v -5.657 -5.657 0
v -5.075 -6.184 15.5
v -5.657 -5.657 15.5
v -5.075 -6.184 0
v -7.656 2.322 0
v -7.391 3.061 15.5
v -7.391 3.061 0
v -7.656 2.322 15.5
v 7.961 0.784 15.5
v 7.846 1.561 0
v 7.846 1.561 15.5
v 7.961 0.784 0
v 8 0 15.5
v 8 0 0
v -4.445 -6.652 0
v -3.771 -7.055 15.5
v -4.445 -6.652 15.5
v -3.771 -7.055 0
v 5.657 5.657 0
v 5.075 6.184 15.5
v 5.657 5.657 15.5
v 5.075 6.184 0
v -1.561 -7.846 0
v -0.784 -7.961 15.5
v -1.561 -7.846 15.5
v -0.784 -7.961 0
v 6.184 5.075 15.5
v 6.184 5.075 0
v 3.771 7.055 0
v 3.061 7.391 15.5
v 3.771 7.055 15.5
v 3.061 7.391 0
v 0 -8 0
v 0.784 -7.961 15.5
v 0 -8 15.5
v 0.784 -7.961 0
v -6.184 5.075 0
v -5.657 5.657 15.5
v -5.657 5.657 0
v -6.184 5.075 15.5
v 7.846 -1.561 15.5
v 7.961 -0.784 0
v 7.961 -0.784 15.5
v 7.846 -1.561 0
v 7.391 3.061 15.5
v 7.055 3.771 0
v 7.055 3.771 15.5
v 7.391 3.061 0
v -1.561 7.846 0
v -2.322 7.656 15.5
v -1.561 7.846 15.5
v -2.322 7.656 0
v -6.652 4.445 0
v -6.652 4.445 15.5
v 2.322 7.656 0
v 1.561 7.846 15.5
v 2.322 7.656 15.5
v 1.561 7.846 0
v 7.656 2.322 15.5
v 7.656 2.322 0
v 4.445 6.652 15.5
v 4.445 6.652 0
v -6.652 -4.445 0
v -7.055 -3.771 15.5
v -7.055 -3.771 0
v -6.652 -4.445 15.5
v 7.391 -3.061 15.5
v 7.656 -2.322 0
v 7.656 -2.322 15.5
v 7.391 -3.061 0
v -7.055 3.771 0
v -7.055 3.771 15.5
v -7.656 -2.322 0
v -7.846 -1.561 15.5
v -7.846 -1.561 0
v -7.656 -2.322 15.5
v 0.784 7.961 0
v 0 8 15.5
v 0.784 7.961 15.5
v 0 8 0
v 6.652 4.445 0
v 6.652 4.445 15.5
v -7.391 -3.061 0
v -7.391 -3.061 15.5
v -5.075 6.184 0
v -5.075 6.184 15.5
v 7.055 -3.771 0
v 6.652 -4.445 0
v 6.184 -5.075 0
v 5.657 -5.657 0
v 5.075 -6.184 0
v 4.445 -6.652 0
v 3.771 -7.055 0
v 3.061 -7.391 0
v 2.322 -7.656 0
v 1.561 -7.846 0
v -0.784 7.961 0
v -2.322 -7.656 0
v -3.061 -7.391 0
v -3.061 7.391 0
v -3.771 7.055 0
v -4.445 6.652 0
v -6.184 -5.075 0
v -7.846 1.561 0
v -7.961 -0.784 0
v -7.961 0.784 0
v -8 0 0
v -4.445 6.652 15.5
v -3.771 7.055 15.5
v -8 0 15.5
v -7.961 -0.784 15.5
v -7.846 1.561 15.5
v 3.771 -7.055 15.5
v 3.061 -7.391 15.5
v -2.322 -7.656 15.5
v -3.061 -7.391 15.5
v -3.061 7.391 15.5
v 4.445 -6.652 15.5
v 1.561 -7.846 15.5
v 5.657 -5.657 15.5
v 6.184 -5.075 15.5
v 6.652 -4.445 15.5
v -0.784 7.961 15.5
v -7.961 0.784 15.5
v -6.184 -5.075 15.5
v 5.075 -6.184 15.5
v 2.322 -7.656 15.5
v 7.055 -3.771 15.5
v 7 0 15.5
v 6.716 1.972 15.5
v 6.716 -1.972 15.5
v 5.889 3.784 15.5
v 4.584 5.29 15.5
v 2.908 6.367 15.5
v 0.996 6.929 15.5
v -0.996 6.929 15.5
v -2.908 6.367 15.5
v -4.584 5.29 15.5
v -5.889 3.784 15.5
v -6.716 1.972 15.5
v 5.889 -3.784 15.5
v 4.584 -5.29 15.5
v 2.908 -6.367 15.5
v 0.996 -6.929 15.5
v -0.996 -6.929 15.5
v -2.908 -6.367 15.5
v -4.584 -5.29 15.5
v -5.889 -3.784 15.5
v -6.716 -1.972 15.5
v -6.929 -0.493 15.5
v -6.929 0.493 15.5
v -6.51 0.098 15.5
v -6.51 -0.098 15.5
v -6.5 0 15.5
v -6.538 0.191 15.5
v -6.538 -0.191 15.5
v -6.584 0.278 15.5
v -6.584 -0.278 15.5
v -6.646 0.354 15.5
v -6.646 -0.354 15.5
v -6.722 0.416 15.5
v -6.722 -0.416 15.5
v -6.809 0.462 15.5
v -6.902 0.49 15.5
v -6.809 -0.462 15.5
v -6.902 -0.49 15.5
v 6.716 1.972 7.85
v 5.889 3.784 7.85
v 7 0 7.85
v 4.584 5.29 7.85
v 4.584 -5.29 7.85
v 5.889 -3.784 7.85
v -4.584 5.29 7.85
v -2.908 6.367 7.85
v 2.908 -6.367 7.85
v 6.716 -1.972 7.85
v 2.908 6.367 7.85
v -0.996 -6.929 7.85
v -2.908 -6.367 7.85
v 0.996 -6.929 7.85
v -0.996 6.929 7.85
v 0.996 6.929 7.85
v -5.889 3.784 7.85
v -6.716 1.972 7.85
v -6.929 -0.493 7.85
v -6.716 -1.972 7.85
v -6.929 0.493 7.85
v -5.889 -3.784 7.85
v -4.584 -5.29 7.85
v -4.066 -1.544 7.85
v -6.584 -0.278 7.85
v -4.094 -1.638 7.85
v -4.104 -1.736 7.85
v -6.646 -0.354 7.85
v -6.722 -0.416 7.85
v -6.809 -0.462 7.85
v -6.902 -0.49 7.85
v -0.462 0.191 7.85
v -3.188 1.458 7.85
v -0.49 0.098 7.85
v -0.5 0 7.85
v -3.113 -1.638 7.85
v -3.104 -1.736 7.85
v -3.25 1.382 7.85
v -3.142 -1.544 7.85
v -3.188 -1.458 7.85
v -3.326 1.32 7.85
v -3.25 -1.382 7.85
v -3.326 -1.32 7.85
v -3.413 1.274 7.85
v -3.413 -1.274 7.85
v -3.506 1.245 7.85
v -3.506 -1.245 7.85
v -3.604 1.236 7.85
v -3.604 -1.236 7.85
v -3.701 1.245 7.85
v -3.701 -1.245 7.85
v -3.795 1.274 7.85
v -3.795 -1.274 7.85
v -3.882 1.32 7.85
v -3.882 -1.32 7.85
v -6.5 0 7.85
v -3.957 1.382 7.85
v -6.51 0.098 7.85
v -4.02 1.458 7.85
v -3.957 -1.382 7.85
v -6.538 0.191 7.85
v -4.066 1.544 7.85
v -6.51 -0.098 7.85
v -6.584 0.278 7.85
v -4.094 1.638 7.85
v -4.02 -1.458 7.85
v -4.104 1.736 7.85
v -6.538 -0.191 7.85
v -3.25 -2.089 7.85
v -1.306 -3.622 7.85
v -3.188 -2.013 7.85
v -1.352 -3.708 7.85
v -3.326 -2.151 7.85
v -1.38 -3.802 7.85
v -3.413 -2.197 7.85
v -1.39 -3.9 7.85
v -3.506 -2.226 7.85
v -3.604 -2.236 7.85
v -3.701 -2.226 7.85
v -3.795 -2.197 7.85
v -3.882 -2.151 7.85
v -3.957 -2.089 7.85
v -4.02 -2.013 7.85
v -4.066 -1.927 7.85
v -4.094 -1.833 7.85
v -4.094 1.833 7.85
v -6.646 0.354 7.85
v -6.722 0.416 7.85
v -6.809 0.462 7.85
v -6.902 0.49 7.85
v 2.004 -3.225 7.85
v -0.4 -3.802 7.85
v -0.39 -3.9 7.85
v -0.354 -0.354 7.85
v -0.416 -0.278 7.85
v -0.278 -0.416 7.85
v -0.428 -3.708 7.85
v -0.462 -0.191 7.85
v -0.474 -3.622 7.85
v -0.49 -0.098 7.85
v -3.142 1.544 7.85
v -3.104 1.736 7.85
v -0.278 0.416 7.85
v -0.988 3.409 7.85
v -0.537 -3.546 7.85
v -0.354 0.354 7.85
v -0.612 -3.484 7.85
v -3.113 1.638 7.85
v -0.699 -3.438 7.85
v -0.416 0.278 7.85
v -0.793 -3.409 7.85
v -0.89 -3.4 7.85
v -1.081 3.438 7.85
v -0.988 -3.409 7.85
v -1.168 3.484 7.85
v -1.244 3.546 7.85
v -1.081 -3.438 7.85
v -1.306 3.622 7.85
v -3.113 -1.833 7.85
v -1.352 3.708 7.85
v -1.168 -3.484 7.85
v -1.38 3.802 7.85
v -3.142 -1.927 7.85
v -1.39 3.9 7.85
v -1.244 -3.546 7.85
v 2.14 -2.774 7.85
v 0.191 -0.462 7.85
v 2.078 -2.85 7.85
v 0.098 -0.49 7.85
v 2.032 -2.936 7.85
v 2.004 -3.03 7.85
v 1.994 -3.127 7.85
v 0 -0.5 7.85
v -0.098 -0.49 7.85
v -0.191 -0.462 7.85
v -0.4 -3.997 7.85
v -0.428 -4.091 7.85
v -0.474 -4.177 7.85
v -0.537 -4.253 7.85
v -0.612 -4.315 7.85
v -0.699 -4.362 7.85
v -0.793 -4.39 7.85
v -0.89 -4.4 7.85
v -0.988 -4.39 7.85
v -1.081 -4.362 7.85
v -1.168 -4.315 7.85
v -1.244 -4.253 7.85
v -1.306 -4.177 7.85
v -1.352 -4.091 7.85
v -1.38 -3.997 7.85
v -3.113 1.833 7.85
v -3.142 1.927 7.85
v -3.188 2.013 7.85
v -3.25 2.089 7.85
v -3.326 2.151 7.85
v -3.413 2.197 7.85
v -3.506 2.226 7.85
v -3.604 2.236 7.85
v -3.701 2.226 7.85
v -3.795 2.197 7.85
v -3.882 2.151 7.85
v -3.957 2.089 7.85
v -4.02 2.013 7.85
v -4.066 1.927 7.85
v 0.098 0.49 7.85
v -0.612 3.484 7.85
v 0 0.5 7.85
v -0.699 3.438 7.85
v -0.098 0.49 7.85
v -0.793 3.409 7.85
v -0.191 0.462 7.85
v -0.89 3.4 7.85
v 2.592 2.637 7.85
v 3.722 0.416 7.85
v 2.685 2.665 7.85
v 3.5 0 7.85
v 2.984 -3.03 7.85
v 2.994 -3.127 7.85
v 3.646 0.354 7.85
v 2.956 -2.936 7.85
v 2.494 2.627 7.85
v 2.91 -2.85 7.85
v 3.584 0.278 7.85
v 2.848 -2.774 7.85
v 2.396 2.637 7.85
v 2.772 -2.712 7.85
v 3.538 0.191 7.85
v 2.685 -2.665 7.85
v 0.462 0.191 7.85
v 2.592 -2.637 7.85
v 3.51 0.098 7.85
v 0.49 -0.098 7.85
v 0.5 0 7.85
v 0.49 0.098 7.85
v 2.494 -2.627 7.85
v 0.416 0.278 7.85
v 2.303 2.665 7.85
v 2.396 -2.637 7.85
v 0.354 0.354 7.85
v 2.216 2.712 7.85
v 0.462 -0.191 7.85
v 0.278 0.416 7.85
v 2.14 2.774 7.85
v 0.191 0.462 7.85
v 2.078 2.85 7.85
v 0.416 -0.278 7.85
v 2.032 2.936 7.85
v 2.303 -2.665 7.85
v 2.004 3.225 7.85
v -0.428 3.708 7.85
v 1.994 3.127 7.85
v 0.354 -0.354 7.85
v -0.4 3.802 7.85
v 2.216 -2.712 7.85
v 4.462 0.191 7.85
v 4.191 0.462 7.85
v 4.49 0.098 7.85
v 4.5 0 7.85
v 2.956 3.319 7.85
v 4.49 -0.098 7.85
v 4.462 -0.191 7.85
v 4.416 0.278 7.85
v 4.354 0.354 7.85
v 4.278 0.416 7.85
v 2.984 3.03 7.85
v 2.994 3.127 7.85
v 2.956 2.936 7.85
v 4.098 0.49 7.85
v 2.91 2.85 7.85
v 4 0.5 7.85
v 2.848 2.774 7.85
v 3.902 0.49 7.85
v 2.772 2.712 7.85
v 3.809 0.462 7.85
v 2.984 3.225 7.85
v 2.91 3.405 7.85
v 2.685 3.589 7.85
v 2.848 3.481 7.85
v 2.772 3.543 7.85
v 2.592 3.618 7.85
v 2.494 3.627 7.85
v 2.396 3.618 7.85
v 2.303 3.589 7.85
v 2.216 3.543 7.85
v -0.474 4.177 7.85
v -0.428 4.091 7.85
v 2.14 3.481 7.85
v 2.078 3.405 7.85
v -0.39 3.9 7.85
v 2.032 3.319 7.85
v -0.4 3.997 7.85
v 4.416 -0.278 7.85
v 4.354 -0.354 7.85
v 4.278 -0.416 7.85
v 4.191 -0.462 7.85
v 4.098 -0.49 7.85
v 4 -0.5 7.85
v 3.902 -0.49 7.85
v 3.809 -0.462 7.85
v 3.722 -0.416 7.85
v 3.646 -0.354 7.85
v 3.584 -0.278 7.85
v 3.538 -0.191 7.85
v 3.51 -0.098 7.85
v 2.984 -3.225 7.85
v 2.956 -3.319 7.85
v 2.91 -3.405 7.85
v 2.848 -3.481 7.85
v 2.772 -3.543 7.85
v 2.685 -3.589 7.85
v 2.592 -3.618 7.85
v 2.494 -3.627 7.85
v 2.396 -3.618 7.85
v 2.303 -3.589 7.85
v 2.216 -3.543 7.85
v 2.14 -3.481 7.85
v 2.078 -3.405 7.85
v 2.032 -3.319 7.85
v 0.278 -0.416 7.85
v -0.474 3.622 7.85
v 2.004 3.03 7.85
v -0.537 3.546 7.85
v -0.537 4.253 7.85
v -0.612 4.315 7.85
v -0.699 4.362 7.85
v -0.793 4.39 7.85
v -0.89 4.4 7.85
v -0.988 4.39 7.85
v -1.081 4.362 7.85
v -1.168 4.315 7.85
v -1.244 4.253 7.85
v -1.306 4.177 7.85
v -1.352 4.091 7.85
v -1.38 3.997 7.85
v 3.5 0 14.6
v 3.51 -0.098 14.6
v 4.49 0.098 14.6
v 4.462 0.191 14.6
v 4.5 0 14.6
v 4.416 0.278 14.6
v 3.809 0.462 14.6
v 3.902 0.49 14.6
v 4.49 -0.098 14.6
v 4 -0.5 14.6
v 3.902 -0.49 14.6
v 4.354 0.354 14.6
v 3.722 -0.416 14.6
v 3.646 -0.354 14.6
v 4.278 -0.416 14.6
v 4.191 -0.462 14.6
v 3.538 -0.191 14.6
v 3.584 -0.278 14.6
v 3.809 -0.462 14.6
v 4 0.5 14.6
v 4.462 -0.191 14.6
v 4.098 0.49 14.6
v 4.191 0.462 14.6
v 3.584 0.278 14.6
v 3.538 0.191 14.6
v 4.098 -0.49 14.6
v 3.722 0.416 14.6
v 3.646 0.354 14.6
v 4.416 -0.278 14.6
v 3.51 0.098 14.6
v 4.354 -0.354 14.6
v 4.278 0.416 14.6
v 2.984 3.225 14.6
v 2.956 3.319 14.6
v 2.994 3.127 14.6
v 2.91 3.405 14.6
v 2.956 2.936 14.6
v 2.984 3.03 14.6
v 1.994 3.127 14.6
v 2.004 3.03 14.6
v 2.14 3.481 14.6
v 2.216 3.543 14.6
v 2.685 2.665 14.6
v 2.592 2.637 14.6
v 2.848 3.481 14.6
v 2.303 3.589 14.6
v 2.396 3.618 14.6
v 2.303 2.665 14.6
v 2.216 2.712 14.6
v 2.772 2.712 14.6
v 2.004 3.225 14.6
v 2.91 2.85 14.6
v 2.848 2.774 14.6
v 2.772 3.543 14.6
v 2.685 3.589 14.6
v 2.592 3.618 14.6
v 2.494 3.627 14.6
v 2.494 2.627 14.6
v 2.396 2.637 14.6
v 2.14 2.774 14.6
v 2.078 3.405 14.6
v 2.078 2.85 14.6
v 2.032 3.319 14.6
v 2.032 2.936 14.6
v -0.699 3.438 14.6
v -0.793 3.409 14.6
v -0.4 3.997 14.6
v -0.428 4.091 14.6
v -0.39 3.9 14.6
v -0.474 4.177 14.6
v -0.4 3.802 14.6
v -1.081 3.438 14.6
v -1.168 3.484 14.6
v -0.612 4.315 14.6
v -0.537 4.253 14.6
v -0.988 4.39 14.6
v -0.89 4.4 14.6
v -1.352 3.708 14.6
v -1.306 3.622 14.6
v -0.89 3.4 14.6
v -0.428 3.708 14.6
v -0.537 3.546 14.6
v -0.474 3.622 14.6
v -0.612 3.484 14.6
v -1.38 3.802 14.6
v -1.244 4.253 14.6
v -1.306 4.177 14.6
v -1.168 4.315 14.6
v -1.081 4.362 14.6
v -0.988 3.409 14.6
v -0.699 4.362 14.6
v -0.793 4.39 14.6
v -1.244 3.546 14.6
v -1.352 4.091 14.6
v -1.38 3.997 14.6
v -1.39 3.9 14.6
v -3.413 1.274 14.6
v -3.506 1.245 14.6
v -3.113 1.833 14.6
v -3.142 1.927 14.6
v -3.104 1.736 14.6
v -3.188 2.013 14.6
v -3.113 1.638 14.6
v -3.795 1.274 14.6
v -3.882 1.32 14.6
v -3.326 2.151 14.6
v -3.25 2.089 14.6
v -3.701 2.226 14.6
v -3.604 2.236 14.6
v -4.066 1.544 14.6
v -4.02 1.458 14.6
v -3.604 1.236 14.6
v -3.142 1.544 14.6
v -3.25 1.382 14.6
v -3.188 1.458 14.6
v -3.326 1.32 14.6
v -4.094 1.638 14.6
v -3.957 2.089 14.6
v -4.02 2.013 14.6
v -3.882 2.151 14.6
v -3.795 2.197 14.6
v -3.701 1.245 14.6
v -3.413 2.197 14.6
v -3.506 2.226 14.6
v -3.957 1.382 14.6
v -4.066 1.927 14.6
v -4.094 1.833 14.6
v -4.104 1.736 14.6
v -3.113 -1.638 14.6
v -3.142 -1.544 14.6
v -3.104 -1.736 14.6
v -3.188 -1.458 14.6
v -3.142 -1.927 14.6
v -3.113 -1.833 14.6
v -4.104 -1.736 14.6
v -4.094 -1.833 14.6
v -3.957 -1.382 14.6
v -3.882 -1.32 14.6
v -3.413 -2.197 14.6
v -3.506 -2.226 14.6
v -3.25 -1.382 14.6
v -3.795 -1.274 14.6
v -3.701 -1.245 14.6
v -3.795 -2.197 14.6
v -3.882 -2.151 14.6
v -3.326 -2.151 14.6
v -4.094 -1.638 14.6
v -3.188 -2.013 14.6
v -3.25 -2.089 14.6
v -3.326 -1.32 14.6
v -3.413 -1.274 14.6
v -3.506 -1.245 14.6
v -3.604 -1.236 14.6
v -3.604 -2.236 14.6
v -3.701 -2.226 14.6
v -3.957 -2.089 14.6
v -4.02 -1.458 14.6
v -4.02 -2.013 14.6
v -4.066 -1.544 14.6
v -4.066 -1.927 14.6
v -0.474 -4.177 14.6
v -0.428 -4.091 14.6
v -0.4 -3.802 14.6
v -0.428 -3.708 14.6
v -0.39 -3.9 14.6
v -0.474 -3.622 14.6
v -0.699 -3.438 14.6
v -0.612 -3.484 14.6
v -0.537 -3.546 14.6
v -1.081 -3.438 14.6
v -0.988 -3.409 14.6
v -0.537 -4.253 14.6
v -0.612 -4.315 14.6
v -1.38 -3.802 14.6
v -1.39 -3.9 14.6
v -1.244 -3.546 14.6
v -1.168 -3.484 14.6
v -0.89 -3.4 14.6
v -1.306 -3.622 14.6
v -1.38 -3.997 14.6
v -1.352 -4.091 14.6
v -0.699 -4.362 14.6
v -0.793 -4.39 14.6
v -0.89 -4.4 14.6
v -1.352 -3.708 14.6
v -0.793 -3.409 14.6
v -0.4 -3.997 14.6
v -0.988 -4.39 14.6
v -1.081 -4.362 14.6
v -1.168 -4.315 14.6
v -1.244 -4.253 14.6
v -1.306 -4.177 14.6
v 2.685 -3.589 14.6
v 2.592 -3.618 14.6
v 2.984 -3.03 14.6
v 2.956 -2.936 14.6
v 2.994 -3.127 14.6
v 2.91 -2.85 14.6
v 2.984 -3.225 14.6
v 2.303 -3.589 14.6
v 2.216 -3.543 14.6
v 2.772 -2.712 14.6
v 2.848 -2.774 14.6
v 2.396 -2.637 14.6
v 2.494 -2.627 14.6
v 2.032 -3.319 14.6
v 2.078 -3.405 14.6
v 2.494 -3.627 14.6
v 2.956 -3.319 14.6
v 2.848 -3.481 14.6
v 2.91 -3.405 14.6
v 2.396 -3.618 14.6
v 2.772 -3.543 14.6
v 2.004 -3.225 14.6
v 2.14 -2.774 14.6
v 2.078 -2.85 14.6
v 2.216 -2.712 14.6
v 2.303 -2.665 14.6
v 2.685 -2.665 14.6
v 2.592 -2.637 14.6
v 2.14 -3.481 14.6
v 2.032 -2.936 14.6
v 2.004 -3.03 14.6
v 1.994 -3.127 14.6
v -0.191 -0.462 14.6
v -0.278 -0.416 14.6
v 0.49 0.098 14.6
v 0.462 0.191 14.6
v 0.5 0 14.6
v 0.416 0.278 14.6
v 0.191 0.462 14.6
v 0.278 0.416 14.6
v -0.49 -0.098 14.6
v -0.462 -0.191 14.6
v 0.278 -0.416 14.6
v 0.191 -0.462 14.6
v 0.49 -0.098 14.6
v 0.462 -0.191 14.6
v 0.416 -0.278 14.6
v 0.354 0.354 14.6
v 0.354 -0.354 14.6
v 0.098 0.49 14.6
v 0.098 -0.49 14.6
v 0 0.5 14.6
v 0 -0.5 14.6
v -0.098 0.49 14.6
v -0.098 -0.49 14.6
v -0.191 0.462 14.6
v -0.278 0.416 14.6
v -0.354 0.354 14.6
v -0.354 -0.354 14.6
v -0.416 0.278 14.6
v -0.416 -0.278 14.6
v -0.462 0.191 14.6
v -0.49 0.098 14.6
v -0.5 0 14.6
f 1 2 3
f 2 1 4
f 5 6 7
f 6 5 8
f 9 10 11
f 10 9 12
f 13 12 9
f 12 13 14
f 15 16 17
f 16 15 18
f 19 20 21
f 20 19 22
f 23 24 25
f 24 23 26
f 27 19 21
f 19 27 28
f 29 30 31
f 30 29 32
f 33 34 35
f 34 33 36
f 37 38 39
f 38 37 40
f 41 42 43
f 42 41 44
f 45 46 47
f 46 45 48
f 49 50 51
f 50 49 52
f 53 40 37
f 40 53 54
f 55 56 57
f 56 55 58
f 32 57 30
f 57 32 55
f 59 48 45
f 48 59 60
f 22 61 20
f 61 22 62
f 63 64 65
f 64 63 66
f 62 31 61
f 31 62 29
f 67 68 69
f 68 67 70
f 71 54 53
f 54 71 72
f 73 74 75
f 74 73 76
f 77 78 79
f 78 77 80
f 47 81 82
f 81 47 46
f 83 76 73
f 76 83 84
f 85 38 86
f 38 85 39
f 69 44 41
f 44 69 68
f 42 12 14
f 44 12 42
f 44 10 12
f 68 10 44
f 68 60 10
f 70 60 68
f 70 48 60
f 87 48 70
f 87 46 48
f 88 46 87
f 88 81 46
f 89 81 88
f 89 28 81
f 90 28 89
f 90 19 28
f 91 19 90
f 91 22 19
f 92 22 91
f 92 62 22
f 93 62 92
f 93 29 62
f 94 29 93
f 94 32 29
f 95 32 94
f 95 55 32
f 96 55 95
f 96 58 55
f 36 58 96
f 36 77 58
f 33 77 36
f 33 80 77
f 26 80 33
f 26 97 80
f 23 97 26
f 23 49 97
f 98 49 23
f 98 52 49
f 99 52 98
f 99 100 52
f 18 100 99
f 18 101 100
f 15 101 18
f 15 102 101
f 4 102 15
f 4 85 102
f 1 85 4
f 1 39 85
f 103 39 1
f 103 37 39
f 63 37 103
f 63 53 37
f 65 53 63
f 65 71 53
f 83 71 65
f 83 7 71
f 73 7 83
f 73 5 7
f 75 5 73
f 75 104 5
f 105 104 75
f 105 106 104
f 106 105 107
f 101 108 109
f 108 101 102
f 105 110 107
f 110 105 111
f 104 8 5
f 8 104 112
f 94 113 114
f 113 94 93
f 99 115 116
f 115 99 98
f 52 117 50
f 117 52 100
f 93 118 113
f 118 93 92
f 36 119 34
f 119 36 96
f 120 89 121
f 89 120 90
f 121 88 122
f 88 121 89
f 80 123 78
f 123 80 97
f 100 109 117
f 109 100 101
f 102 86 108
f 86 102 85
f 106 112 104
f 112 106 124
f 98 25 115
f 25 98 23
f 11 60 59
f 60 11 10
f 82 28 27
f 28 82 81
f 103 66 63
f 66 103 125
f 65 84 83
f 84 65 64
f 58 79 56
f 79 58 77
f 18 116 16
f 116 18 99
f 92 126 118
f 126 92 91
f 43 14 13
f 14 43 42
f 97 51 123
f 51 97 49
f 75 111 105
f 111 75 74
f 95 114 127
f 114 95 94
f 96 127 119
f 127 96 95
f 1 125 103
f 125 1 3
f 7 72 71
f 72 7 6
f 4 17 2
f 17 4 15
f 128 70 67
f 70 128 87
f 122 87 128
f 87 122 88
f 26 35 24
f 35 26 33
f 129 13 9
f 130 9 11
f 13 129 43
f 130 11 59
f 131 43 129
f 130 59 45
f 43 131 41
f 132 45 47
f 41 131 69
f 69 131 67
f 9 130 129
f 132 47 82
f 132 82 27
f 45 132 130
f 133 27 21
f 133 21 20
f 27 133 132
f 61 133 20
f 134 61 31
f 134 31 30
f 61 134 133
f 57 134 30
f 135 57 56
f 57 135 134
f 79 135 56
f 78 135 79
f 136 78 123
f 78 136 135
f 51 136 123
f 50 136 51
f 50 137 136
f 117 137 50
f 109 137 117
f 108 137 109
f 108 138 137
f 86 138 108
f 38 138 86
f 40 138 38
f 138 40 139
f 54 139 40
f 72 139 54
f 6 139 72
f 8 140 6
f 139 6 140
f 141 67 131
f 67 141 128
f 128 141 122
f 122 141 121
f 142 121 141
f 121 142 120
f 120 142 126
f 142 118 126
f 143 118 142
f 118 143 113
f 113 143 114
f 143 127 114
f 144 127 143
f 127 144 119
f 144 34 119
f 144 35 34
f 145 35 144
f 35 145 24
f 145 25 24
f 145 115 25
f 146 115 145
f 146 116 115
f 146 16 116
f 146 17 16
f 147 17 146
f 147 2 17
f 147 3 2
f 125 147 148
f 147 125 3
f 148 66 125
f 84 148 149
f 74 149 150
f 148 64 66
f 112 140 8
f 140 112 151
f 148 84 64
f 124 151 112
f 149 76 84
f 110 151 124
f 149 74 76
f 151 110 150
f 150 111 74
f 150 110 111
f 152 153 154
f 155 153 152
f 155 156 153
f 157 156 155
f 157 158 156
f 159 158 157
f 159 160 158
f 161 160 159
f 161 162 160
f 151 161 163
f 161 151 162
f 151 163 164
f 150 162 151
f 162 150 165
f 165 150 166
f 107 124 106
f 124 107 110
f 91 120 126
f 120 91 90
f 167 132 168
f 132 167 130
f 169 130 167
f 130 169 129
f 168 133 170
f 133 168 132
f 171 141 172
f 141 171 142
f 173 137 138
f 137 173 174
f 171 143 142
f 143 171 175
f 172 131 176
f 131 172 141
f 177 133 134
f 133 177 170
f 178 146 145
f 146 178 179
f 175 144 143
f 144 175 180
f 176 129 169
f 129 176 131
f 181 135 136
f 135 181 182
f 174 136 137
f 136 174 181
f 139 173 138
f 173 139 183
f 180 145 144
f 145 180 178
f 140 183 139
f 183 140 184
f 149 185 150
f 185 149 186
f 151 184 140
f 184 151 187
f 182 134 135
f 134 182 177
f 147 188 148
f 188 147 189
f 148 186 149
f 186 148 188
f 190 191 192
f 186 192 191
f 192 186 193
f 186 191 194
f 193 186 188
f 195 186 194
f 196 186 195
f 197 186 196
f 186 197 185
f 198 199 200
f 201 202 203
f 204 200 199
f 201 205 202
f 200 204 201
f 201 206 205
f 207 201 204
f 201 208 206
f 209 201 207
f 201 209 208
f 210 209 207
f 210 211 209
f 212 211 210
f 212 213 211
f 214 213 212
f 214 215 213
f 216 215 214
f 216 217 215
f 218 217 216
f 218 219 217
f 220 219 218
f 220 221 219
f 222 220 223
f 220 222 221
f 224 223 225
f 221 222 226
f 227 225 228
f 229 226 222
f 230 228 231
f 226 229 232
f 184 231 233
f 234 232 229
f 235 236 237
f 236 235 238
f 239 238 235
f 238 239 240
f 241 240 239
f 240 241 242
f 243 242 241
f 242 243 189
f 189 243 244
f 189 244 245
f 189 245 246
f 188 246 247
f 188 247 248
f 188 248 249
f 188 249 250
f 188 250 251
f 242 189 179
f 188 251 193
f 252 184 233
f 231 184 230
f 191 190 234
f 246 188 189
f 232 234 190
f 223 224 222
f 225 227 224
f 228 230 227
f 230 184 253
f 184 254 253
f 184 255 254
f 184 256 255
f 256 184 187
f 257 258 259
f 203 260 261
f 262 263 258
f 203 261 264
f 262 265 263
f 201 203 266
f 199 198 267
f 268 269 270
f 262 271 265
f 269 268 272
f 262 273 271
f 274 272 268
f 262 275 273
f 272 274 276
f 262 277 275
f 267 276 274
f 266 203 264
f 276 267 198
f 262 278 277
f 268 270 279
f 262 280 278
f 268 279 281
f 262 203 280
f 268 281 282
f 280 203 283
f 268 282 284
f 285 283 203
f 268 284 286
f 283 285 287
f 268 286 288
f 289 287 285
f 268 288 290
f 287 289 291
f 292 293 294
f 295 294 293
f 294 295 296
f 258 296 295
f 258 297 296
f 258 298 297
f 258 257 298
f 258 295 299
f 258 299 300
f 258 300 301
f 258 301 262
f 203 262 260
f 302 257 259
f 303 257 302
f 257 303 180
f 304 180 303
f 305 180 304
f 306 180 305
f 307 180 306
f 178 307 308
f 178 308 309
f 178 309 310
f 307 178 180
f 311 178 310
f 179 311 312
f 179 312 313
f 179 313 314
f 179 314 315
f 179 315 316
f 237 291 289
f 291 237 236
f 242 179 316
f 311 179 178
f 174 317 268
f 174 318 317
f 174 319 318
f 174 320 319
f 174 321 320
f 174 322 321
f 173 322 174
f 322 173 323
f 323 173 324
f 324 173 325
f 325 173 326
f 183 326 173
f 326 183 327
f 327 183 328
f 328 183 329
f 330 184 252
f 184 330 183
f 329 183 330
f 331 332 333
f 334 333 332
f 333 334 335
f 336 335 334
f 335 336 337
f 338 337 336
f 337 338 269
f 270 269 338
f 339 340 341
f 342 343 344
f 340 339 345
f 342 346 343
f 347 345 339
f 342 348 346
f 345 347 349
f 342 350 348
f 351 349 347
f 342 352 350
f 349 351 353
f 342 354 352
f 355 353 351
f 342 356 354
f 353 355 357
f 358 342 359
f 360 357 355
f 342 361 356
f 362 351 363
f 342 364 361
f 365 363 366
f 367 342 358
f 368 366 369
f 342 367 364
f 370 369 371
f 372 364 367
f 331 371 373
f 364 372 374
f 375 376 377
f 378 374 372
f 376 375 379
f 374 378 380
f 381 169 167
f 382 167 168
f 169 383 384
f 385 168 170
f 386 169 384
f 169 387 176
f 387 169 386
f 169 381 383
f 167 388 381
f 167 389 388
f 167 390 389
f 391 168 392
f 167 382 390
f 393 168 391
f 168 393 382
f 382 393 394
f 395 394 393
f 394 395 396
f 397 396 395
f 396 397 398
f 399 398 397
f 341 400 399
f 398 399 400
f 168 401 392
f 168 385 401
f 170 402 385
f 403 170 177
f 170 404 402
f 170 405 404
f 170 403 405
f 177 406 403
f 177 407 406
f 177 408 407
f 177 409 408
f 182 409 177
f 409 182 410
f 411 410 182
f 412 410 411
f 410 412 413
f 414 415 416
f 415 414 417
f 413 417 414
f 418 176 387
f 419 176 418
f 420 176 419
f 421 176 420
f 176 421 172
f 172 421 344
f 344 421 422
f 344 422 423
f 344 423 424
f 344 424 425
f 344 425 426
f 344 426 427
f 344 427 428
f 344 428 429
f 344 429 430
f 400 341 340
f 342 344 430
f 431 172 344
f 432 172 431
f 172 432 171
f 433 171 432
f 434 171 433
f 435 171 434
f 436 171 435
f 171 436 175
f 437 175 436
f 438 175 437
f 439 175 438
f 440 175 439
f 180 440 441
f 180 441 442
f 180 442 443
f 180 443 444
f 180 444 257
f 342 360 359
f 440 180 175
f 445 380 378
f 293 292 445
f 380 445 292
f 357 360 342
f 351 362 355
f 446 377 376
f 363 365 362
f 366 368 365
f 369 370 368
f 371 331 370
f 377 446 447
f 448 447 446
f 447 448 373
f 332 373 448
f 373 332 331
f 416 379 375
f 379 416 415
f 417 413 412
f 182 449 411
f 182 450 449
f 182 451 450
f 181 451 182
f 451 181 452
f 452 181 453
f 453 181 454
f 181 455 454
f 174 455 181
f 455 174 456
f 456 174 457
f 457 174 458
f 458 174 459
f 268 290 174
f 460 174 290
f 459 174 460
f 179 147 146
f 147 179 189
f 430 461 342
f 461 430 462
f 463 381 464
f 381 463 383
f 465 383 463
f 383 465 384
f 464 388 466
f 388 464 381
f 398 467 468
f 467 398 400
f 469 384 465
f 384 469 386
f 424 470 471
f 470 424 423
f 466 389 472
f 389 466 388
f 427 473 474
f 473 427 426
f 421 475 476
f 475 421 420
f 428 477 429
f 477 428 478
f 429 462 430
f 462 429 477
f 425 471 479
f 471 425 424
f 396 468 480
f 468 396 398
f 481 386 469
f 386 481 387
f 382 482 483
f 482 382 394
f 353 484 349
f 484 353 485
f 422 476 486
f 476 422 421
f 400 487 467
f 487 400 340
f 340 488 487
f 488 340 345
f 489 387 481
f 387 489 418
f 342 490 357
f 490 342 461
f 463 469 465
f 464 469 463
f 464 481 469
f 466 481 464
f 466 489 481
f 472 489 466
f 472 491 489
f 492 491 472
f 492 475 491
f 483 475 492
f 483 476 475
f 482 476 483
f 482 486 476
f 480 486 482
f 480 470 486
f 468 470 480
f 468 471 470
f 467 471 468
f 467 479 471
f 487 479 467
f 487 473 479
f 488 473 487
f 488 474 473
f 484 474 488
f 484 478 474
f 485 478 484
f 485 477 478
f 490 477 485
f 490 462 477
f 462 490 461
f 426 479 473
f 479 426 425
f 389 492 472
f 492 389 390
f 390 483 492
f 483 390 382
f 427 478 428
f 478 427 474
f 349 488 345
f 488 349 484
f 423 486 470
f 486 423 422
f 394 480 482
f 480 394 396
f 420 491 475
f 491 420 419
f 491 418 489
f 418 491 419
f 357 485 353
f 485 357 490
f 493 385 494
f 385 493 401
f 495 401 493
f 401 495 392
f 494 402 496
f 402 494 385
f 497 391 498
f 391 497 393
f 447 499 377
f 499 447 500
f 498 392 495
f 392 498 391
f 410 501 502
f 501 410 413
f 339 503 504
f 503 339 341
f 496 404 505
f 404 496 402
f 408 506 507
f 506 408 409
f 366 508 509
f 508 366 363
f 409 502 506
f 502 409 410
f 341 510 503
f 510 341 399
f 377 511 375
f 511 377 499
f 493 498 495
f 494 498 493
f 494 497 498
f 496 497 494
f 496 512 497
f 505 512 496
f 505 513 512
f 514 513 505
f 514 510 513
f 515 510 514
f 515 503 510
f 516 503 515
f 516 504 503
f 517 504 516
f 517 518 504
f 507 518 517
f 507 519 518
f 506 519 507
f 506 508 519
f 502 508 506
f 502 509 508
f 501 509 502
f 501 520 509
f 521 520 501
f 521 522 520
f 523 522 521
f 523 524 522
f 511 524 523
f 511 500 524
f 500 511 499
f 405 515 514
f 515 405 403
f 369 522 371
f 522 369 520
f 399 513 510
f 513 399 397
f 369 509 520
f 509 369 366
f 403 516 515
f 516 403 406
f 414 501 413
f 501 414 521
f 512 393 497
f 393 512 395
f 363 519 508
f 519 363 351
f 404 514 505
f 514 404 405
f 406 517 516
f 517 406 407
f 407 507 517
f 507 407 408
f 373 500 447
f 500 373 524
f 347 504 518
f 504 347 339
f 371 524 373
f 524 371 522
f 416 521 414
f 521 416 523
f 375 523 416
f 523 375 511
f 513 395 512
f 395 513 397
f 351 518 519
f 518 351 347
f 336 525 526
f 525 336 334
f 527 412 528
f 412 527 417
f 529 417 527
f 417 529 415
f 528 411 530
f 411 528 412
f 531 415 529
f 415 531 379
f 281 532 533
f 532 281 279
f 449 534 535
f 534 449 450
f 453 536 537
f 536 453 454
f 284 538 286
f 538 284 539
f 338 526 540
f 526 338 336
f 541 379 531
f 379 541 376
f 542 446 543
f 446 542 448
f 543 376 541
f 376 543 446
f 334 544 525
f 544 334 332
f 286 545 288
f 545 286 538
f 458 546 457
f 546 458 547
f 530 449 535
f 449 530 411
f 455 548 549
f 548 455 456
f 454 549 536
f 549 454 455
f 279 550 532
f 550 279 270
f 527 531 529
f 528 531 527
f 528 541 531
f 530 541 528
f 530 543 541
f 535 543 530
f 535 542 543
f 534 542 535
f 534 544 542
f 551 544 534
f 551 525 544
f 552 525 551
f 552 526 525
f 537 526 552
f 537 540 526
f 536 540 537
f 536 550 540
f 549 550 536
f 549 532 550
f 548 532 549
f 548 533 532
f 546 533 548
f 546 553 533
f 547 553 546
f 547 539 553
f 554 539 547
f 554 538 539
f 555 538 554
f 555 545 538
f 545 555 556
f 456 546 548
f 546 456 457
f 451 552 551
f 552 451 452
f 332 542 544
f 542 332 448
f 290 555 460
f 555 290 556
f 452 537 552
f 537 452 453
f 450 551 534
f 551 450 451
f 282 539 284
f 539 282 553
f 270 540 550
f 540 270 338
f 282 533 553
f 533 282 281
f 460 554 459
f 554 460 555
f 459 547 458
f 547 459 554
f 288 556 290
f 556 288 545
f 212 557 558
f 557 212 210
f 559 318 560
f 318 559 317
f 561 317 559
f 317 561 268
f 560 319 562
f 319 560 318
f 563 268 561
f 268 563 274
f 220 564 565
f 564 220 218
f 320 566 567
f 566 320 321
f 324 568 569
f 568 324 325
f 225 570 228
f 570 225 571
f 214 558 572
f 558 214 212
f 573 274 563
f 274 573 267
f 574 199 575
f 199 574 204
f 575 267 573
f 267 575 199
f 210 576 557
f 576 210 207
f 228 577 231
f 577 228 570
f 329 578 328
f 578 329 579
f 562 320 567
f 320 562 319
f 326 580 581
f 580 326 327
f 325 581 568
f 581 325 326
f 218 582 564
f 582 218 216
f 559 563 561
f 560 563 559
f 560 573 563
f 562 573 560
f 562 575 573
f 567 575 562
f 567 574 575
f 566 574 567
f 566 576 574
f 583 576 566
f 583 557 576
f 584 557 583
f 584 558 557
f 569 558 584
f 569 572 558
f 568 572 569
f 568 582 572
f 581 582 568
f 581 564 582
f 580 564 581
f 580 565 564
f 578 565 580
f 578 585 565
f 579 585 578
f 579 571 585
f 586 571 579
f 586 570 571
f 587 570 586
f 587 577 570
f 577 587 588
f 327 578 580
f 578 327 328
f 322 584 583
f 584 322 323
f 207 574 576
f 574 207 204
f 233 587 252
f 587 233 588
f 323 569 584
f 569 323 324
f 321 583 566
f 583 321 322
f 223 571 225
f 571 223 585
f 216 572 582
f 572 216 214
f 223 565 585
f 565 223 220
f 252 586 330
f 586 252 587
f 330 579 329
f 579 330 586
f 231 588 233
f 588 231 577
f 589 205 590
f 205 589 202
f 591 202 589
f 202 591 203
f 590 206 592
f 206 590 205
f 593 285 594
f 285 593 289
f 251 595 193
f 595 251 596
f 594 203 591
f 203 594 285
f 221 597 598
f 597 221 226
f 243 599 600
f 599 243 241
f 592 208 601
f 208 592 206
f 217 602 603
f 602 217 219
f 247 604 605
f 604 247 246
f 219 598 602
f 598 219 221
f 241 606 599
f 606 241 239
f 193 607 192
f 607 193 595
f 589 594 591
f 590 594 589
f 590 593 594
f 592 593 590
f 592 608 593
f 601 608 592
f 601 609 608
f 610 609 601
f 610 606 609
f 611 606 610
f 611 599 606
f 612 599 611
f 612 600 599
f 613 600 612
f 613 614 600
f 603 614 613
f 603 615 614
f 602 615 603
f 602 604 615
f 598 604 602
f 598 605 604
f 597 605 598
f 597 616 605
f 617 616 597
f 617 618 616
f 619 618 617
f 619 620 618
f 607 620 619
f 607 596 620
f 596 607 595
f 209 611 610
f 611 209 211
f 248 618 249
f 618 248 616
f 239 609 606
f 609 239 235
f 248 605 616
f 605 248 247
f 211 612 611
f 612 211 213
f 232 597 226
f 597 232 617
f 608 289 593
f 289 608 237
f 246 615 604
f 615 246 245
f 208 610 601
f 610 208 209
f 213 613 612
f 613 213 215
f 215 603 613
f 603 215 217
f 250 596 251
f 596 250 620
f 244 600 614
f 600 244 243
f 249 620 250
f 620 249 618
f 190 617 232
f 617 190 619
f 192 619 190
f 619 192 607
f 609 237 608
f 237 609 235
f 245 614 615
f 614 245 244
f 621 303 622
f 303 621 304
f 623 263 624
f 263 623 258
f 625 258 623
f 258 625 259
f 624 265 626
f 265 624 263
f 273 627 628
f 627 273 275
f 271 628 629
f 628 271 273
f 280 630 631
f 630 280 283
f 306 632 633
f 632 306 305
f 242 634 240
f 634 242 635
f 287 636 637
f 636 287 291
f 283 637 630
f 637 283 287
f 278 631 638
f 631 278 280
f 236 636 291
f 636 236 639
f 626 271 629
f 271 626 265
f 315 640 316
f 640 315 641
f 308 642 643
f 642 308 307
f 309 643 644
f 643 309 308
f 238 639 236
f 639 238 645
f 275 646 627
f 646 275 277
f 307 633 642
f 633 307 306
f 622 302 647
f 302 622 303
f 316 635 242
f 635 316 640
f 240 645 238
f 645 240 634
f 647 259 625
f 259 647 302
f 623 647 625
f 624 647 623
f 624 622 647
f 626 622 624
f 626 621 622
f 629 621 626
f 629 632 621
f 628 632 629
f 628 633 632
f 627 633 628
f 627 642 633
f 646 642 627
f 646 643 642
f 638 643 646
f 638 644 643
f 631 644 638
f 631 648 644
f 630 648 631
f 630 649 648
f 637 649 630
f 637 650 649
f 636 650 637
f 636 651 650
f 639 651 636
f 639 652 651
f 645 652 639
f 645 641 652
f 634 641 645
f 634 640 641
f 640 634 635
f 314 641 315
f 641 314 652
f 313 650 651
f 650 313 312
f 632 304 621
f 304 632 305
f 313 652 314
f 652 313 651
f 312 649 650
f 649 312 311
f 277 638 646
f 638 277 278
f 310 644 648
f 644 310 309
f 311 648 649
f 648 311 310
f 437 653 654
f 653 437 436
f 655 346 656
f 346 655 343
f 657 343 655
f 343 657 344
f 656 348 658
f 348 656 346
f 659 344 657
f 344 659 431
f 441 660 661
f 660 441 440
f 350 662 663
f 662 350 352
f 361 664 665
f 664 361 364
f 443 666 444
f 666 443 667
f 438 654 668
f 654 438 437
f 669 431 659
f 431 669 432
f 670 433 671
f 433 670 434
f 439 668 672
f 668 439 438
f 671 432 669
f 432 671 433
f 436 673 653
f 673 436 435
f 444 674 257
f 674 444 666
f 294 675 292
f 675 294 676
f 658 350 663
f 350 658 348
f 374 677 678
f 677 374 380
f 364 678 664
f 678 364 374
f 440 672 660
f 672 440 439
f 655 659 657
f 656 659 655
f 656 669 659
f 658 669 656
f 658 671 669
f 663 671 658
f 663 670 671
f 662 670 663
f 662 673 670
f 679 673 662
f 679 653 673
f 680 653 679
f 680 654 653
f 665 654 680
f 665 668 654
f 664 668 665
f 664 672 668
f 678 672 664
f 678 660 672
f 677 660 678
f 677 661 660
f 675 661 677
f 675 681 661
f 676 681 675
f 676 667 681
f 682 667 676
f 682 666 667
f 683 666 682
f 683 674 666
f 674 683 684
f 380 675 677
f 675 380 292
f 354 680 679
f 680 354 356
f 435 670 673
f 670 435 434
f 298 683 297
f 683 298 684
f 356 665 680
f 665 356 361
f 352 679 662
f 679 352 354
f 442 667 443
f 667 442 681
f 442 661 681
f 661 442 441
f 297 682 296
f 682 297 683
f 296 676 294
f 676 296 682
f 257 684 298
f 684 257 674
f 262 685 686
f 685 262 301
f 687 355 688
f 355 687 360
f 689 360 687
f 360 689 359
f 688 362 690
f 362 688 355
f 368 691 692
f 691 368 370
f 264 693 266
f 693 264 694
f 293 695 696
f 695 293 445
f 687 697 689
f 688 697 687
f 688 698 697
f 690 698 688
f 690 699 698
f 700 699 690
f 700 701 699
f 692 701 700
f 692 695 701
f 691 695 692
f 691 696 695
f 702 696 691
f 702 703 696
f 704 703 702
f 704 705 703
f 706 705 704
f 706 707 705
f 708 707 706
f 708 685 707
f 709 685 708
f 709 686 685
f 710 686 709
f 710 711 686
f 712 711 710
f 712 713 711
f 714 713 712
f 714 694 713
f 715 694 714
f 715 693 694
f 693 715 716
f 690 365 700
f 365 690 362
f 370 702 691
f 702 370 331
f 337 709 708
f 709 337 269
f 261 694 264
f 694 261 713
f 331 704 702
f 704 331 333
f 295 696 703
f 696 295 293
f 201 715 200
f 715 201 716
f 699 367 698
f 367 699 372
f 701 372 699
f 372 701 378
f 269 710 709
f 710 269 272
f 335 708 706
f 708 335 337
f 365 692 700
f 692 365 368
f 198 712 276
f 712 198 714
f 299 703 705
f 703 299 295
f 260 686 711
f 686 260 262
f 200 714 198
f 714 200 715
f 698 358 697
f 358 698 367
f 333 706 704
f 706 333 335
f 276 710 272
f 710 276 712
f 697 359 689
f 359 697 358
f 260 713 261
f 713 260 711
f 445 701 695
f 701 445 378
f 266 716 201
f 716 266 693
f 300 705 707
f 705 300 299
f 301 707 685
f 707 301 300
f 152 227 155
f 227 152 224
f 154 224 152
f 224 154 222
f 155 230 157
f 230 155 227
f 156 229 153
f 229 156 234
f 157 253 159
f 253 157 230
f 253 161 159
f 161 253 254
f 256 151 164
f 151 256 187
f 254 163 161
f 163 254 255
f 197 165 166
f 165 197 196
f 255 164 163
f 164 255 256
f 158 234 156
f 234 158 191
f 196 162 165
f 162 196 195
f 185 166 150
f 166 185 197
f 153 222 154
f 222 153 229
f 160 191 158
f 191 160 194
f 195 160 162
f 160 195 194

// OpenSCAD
// file: config.scad
box_length = 100;
box_width = 50;
box_height = 20;

// options: builtin, addon
solder_tip_cleaner = "addon";

display_pcb_height = 60;
display_pcb_width = 100;

display_height = 40;
display_width = 97;
display_depth = 10;

power_plug_height = 47;
power_plug_width = 27;

solder_plug_pins = 8;
solder_plug_middle_pin = 1;
// main file
include <config.scad>

gx16_r = 8;
gx16_h = 15.5;

module gx16(){
    difference(){
        cylinder(r= 8, h=gx16_h, $fn=64);
        
        translate([0,0,gx16_h/2 + 0.1]) cylinder(r=7, h = gx16_h/2);
    }
    
    if(solder_plug_middle_pin == 1) translate([0,0,gx16_h/2 + 0.1]) cylinder(r=0.5, h=gx16_h/2 - 1, $fn=32);
    
    radius = 4;
    for(i = [0:solder_plug_pins - solder_plug_middle_pin - 1]){

        grad = i * (360/(solder_plug_pins - solder_plug_middle_pin));
        x = cos(grad) * radius;
        y = sin(grad) * radius;
        translate([x,y,gx16_h/2 + 0.1]) cylinder(r=0.5, h=gx16_h/2 - 1, $fn=32);
    }
    
    translate([-7,0,7.75]) cylinder(r=0.5, h= gx16_h/2, $fn=32);
}


gx16();
